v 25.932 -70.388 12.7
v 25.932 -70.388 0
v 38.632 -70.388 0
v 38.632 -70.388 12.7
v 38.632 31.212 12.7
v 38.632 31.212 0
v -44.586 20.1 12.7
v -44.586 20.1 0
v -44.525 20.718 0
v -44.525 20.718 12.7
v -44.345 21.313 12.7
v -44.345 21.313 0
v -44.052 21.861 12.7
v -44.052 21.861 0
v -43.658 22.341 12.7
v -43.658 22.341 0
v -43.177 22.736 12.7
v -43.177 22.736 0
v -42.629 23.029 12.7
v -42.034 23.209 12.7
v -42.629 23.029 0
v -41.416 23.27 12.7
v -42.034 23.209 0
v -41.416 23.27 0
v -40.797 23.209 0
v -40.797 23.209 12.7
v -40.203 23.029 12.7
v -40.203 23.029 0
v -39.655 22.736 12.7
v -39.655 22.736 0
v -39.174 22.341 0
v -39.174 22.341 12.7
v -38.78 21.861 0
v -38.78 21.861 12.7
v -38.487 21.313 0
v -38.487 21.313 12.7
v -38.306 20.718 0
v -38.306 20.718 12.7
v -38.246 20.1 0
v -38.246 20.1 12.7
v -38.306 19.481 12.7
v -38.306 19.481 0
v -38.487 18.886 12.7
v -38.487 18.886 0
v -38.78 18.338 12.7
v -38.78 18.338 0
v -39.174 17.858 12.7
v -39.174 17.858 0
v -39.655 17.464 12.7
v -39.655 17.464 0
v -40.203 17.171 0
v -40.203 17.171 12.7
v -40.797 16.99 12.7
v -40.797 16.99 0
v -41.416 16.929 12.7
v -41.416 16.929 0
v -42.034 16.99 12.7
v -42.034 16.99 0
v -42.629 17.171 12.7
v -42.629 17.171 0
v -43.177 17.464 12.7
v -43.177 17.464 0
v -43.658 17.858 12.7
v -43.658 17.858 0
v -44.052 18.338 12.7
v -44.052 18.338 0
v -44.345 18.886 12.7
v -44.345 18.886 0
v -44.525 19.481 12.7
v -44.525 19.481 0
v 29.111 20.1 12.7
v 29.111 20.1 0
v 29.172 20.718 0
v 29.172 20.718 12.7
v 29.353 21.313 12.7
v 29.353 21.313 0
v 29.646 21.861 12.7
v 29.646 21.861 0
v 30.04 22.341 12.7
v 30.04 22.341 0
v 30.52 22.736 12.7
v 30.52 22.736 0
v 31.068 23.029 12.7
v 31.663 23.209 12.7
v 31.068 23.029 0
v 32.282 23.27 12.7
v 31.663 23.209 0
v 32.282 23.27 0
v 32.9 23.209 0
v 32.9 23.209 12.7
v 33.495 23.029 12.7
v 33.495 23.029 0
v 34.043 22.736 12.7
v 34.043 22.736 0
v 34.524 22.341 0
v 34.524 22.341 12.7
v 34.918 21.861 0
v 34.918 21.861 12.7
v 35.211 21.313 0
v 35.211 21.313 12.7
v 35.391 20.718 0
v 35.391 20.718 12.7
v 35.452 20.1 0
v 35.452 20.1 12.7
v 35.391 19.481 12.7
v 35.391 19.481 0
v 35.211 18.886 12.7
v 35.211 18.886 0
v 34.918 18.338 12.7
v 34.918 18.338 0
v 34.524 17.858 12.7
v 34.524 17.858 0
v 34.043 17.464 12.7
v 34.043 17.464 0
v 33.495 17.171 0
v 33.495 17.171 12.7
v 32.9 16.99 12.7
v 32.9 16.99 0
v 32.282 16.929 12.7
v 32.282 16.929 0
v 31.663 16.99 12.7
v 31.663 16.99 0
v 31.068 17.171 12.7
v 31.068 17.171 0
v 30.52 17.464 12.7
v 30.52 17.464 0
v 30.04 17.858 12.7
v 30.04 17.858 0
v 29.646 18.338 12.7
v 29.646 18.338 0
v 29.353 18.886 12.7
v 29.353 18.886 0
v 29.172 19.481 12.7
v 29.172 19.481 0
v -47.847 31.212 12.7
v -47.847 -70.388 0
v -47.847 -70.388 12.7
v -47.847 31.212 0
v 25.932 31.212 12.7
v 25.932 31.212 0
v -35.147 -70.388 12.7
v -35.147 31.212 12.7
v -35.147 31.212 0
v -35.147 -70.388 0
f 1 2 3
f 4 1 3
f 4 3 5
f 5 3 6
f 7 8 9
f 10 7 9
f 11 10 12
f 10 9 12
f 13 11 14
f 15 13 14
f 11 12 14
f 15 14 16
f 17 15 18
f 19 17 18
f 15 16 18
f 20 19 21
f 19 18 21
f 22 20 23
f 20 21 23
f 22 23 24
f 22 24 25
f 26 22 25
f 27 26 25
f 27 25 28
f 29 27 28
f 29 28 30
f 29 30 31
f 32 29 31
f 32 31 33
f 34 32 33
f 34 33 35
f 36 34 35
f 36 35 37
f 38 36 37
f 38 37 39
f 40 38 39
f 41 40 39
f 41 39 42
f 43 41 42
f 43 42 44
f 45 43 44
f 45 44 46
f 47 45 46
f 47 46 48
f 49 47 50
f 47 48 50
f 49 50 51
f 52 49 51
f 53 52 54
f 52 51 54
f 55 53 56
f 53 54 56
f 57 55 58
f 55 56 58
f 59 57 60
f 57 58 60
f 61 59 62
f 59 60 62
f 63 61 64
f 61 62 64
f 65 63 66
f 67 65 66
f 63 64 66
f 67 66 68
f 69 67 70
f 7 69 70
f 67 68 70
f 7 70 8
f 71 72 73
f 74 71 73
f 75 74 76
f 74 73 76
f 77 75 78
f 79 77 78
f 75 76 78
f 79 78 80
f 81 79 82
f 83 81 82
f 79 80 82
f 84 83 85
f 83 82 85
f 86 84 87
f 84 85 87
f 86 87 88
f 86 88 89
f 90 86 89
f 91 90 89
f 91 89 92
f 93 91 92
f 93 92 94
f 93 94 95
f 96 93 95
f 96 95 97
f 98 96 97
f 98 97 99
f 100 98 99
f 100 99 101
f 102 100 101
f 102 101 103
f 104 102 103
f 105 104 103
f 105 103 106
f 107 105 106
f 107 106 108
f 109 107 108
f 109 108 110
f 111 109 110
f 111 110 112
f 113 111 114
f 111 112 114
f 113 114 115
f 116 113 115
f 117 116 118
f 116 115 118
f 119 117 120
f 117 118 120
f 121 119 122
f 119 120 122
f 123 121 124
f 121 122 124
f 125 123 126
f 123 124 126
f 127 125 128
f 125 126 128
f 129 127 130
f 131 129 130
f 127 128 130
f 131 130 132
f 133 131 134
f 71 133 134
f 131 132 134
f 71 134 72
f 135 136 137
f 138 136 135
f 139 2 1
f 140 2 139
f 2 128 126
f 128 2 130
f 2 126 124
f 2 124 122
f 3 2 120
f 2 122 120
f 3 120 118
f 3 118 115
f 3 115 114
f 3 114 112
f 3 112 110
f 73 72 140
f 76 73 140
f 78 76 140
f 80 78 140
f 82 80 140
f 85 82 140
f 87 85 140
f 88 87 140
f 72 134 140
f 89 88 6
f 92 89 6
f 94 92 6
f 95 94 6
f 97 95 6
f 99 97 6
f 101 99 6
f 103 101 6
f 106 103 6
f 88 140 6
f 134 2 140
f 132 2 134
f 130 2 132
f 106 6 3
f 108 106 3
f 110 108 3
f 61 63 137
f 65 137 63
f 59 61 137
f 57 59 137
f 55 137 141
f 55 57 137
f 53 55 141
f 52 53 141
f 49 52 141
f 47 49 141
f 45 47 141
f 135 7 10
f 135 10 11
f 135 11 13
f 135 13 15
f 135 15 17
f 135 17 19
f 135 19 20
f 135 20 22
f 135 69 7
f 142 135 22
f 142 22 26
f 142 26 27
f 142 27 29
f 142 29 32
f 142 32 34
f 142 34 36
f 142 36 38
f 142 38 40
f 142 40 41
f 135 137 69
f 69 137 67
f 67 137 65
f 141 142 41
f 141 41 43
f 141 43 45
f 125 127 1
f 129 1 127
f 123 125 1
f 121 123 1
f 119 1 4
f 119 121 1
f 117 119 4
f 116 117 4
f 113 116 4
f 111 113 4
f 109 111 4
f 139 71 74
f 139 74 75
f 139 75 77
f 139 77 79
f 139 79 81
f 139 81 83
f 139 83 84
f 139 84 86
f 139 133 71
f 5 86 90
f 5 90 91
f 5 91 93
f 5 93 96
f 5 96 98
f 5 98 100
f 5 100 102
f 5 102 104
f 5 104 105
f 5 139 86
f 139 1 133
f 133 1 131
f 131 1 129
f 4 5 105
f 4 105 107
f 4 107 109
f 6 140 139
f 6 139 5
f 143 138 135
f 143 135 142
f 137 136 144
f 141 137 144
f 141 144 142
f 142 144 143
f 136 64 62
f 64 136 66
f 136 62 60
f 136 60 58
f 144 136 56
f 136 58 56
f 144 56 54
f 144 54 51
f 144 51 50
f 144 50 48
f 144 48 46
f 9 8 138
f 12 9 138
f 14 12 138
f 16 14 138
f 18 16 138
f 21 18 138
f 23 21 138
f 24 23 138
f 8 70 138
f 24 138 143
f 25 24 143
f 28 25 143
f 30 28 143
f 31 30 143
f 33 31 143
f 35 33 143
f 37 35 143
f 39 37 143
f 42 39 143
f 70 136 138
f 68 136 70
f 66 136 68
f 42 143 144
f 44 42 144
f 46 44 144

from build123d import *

# Parameters (mm, degrees)
F0_W     = 12.7
F0_H     = 101.6
F1_DEPTH = 12.7
F3_D     = 6.340754
F4_D     = 6.340754


with BuildPart() as f1:
    # F0 (on Top) → F1 (new body)
    with BuildSketch(Plane.XY):
        with Locations((-41.49677, -19.588223)):
            Rectangle(F0_W, F0_H)
        with Locations((32.28172, -19.588223)):
            Rectangle(F0_W, F0_H)
    extrude(amount=F1_DEPTH)

    # F3 (through all)
    with Locations(Plane.XY.offset(12.7)):
        with Locations((32.28172, 20.099591)):
            Hole(F3_D / 2)

    # F4 (through all)
    with Locations(Plane.XY.offset(12.7)):
        with Locations((-41.415945, 20.099591)):
            Hole(F4_D / 2)


solid = f1.part
